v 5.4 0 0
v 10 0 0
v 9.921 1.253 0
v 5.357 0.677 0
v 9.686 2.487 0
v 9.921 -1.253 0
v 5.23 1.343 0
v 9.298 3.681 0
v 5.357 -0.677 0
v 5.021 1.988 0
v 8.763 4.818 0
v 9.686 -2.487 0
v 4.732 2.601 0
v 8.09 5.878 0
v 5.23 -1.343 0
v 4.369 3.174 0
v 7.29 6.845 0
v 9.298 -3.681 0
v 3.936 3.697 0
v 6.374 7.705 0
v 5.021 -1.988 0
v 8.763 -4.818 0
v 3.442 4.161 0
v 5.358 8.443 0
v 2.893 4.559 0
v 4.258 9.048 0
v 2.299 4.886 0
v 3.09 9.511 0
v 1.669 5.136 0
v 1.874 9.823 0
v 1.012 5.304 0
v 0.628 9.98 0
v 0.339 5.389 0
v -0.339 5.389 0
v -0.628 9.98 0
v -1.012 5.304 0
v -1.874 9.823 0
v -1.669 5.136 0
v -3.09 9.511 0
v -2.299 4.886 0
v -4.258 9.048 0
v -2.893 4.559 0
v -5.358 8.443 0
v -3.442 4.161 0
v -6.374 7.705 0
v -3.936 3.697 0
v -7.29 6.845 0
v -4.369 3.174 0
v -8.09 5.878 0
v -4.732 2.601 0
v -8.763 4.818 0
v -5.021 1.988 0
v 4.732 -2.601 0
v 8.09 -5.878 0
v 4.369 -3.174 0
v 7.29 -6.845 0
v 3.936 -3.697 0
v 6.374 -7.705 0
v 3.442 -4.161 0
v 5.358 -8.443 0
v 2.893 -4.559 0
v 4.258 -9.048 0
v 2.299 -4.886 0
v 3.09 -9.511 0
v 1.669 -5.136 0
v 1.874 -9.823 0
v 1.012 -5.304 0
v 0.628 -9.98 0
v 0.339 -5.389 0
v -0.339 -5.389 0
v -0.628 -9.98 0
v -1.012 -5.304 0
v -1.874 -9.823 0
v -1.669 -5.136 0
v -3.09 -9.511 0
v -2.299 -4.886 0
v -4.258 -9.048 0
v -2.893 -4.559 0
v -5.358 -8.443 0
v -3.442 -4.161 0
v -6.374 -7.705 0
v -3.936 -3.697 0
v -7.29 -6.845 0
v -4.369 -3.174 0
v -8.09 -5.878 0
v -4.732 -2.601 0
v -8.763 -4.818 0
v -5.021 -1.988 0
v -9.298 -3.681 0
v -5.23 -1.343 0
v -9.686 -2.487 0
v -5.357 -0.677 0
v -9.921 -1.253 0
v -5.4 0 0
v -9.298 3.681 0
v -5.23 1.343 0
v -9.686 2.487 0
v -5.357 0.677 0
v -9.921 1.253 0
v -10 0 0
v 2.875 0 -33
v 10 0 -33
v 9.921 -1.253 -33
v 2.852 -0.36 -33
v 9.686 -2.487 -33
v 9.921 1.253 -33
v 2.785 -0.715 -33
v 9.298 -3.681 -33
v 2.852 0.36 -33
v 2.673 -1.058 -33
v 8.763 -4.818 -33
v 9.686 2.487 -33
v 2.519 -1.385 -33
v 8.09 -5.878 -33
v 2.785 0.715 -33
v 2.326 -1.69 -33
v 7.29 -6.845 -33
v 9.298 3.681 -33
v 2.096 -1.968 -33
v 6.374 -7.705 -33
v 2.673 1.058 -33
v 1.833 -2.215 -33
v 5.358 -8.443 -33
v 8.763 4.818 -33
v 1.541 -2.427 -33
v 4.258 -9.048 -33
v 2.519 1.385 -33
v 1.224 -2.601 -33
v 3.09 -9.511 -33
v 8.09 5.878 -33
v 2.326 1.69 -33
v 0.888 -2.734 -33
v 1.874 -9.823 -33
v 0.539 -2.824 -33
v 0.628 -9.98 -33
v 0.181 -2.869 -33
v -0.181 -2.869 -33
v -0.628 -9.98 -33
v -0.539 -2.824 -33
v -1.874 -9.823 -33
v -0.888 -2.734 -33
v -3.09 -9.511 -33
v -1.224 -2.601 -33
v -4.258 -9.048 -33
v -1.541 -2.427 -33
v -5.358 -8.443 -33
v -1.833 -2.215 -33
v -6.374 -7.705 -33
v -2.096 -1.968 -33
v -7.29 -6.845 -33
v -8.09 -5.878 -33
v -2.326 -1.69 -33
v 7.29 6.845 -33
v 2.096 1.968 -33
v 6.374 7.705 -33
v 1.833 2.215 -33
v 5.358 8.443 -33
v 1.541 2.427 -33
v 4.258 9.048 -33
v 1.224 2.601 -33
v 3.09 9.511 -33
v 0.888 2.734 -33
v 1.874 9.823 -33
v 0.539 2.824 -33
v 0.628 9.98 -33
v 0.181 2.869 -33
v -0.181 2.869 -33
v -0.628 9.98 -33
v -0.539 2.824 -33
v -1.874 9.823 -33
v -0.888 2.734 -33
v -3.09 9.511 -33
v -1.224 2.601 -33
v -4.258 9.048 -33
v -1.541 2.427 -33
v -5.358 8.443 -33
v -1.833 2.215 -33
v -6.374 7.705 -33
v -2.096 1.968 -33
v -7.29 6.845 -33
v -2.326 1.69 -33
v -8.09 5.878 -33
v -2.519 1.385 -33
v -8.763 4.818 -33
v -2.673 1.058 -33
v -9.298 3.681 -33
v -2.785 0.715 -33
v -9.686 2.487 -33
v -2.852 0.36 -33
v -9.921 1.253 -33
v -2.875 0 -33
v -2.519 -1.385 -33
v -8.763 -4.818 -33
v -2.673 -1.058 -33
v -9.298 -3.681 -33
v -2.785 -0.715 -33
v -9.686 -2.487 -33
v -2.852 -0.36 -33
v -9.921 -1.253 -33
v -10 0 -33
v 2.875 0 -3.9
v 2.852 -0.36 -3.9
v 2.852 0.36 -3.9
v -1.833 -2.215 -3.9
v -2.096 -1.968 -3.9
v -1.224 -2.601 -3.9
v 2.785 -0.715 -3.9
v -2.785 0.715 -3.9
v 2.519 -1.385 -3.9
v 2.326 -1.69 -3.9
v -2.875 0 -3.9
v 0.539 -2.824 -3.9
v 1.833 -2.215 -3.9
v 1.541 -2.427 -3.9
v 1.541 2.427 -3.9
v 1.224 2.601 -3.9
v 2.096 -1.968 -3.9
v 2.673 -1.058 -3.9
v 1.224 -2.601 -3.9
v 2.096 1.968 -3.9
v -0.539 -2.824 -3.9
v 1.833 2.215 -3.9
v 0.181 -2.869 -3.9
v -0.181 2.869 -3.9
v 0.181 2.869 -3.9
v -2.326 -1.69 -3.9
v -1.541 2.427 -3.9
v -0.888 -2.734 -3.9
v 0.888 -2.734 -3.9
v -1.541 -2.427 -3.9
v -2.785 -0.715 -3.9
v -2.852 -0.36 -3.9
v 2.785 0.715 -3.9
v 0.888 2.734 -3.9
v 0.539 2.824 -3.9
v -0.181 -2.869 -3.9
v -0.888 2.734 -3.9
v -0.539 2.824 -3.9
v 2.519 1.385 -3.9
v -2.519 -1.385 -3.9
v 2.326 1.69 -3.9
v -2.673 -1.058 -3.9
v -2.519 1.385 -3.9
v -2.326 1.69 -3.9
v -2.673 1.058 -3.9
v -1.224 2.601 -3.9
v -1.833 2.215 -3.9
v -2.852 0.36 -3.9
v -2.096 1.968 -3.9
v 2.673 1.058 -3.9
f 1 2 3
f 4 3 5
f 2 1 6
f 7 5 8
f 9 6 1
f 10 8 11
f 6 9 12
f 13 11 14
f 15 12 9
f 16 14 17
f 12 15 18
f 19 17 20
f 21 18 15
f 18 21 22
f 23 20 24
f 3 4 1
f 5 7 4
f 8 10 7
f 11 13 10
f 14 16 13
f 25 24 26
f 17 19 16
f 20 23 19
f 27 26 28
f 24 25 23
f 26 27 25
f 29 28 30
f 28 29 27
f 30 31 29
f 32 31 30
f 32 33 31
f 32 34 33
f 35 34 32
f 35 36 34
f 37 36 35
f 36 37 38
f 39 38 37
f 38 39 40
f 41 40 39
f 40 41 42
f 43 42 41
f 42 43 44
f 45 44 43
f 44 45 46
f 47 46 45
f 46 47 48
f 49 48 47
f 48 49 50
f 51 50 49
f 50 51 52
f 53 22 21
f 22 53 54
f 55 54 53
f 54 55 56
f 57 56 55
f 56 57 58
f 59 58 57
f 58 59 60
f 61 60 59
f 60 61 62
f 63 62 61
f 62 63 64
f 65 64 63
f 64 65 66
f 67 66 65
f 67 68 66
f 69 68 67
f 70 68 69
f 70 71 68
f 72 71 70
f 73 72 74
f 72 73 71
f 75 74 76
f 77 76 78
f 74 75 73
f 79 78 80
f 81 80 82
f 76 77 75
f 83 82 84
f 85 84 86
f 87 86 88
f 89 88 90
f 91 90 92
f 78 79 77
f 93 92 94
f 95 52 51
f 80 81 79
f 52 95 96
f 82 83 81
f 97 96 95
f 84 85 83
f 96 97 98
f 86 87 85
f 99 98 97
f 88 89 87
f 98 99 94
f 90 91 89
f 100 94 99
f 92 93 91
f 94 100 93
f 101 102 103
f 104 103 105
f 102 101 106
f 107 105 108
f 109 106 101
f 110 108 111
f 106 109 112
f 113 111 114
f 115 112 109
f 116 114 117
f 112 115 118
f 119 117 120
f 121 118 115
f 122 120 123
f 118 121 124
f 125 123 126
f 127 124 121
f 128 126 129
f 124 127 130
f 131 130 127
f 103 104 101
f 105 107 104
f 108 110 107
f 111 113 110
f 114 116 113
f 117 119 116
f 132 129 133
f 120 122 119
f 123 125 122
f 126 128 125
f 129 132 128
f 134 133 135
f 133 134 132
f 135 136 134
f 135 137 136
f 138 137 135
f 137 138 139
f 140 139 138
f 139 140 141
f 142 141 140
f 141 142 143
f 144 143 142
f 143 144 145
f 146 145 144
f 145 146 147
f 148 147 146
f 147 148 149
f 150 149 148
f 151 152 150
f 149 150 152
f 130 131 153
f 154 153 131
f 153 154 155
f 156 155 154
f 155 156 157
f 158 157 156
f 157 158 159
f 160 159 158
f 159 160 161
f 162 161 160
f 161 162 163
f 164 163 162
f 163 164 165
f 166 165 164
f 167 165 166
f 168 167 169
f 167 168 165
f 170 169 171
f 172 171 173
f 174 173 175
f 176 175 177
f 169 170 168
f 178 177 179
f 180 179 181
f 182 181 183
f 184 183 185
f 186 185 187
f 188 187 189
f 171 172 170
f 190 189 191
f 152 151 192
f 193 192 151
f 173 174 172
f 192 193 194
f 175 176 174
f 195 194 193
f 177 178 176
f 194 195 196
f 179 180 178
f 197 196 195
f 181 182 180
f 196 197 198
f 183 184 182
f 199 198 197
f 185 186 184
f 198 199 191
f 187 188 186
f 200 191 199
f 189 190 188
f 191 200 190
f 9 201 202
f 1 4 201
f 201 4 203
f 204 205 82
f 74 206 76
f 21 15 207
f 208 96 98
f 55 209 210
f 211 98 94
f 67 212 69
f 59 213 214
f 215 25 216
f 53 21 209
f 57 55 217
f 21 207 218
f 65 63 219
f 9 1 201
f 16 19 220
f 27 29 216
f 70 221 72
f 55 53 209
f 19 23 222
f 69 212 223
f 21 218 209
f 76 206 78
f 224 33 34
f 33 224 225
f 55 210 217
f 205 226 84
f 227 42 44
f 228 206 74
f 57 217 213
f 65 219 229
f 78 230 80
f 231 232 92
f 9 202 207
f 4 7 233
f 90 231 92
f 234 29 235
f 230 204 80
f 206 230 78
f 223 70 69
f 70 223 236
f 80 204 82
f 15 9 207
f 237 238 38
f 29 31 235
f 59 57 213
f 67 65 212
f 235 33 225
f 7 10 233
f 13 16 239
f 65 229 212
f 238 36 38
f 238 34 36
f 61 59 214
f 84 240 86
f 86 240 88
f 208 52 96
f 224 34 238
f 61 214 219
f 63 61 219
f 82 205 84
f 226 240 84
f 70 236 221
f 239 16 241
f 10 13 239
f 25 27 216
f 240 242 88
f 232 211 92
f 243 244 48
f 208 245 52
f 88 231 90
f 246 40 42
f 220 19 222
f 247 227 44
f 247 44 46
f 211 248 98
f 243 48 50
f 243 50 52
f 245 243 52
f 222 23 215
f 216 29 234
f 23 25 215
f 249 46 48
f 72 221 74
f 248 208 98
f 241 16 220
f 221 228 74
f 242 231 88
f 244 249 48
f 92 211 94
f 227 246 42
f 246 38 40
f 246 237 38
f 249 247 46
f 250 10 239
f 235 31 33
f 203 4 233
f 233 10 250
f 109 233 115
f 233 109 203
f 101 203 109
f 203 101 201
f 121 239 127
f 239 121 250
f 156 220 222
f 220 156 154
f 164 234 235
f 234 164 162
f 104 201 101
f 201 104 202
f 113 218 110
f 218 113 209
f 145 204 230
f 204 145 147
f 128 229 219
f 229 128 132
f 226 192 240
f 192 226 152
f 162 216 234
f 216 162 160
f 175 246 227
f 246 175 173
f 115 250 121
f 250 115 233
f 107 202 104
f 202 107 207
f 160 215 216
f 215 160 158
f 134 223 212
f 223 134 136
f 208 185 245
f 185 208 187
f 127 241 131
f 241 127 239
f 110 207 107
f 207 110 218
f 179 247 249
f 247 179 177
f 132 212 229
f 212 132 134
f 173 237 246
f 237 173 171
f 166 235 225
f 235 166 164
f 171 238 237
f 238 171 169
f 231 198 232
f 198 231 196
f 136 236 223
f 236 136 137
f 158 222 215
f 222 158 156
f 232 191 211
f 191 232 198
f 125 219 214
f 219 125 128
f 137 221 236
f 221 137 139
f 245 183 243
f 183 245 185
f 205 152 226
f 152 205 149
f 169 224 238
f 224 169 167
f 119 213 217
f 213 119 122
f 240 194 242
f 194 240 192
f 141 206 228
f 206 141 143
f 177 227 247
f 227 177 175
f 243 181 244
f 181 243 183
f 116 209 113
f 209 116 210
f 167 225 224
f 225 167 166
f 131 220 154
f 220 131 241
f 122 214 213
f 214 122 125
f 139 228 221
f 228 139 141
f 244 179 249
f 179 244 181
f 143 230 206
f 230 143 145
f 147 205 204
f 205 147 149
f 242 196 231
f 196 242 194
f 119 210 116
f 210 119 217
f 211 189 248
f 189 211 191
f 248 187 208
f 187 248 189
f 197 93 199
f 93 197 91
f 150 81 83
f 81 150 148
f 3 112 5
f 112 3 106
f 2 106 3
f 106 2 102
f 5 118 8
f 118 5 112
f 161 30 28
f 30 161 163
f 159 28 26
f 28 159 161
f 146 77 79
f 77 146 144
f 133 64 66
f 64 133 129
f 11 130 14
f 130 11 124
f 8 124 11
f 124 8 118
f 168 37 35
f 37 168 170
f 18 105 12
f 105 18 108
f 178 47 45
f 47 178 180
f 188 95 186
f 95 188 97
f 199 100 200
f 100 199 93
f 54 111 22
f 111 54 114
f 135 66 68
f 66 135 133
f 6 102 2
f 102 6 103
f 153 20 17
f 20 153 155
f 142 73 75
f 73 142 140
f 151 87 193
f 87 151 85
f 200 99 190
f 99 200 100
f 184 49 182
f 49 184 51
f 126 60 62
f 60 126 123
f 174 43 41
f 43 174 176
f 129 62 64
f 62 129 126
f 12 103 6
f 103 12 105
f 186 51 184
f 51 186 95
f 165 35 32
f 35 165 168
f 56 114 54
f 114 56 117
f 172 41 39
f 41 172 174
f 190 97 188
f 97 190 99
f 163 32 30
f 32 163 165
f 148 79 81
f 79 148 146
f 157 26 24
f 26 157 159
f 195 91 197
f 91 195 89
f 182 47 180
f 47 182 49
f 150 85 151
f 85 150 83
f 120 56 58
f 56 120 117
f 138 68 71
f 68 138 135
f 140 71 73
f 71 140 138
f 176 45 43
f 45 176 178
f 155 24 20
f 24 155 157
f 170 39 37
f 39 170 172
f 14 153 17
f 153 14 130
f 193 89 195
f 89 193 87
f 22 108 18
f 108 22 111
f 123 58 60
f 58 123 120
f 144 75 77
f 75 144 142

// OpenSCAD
$fn = 50;


difference() {
	union() {
		translate(v = [0, 0, -33.0000000000]) {
			cylinder(h = 33, r = 10.0000000000);
		}
		cylinder(h = 0, r = 19.0000000000);
	}
	union() {
		translate(v = [0, 0, 0]) {
			rotate(a = [0, 0, 0]) {
				difference() {
					union() {
						#translate(v = [0, 0, -33.0000000000]) {
							cylinder(h = 33, r = 2.6000000000);
						}
						#translate(v = [0, 0, -3.9000000000]) {
							cylinder(h = 3.9000000000, r1 = 2.8750000000, r2 = 5.4000000000);
						}
						#translate(v = [0, 0, -33.0000000000]) {
							cylinder(h = 33, r = 2.8750000000);
						}
						#translate(v = [0, 0, -33.0000000000]) {
							cylinder(h = 33, r = 2.6000000000);
						}
					}
					union();
				}
			}
		}
	}
}
